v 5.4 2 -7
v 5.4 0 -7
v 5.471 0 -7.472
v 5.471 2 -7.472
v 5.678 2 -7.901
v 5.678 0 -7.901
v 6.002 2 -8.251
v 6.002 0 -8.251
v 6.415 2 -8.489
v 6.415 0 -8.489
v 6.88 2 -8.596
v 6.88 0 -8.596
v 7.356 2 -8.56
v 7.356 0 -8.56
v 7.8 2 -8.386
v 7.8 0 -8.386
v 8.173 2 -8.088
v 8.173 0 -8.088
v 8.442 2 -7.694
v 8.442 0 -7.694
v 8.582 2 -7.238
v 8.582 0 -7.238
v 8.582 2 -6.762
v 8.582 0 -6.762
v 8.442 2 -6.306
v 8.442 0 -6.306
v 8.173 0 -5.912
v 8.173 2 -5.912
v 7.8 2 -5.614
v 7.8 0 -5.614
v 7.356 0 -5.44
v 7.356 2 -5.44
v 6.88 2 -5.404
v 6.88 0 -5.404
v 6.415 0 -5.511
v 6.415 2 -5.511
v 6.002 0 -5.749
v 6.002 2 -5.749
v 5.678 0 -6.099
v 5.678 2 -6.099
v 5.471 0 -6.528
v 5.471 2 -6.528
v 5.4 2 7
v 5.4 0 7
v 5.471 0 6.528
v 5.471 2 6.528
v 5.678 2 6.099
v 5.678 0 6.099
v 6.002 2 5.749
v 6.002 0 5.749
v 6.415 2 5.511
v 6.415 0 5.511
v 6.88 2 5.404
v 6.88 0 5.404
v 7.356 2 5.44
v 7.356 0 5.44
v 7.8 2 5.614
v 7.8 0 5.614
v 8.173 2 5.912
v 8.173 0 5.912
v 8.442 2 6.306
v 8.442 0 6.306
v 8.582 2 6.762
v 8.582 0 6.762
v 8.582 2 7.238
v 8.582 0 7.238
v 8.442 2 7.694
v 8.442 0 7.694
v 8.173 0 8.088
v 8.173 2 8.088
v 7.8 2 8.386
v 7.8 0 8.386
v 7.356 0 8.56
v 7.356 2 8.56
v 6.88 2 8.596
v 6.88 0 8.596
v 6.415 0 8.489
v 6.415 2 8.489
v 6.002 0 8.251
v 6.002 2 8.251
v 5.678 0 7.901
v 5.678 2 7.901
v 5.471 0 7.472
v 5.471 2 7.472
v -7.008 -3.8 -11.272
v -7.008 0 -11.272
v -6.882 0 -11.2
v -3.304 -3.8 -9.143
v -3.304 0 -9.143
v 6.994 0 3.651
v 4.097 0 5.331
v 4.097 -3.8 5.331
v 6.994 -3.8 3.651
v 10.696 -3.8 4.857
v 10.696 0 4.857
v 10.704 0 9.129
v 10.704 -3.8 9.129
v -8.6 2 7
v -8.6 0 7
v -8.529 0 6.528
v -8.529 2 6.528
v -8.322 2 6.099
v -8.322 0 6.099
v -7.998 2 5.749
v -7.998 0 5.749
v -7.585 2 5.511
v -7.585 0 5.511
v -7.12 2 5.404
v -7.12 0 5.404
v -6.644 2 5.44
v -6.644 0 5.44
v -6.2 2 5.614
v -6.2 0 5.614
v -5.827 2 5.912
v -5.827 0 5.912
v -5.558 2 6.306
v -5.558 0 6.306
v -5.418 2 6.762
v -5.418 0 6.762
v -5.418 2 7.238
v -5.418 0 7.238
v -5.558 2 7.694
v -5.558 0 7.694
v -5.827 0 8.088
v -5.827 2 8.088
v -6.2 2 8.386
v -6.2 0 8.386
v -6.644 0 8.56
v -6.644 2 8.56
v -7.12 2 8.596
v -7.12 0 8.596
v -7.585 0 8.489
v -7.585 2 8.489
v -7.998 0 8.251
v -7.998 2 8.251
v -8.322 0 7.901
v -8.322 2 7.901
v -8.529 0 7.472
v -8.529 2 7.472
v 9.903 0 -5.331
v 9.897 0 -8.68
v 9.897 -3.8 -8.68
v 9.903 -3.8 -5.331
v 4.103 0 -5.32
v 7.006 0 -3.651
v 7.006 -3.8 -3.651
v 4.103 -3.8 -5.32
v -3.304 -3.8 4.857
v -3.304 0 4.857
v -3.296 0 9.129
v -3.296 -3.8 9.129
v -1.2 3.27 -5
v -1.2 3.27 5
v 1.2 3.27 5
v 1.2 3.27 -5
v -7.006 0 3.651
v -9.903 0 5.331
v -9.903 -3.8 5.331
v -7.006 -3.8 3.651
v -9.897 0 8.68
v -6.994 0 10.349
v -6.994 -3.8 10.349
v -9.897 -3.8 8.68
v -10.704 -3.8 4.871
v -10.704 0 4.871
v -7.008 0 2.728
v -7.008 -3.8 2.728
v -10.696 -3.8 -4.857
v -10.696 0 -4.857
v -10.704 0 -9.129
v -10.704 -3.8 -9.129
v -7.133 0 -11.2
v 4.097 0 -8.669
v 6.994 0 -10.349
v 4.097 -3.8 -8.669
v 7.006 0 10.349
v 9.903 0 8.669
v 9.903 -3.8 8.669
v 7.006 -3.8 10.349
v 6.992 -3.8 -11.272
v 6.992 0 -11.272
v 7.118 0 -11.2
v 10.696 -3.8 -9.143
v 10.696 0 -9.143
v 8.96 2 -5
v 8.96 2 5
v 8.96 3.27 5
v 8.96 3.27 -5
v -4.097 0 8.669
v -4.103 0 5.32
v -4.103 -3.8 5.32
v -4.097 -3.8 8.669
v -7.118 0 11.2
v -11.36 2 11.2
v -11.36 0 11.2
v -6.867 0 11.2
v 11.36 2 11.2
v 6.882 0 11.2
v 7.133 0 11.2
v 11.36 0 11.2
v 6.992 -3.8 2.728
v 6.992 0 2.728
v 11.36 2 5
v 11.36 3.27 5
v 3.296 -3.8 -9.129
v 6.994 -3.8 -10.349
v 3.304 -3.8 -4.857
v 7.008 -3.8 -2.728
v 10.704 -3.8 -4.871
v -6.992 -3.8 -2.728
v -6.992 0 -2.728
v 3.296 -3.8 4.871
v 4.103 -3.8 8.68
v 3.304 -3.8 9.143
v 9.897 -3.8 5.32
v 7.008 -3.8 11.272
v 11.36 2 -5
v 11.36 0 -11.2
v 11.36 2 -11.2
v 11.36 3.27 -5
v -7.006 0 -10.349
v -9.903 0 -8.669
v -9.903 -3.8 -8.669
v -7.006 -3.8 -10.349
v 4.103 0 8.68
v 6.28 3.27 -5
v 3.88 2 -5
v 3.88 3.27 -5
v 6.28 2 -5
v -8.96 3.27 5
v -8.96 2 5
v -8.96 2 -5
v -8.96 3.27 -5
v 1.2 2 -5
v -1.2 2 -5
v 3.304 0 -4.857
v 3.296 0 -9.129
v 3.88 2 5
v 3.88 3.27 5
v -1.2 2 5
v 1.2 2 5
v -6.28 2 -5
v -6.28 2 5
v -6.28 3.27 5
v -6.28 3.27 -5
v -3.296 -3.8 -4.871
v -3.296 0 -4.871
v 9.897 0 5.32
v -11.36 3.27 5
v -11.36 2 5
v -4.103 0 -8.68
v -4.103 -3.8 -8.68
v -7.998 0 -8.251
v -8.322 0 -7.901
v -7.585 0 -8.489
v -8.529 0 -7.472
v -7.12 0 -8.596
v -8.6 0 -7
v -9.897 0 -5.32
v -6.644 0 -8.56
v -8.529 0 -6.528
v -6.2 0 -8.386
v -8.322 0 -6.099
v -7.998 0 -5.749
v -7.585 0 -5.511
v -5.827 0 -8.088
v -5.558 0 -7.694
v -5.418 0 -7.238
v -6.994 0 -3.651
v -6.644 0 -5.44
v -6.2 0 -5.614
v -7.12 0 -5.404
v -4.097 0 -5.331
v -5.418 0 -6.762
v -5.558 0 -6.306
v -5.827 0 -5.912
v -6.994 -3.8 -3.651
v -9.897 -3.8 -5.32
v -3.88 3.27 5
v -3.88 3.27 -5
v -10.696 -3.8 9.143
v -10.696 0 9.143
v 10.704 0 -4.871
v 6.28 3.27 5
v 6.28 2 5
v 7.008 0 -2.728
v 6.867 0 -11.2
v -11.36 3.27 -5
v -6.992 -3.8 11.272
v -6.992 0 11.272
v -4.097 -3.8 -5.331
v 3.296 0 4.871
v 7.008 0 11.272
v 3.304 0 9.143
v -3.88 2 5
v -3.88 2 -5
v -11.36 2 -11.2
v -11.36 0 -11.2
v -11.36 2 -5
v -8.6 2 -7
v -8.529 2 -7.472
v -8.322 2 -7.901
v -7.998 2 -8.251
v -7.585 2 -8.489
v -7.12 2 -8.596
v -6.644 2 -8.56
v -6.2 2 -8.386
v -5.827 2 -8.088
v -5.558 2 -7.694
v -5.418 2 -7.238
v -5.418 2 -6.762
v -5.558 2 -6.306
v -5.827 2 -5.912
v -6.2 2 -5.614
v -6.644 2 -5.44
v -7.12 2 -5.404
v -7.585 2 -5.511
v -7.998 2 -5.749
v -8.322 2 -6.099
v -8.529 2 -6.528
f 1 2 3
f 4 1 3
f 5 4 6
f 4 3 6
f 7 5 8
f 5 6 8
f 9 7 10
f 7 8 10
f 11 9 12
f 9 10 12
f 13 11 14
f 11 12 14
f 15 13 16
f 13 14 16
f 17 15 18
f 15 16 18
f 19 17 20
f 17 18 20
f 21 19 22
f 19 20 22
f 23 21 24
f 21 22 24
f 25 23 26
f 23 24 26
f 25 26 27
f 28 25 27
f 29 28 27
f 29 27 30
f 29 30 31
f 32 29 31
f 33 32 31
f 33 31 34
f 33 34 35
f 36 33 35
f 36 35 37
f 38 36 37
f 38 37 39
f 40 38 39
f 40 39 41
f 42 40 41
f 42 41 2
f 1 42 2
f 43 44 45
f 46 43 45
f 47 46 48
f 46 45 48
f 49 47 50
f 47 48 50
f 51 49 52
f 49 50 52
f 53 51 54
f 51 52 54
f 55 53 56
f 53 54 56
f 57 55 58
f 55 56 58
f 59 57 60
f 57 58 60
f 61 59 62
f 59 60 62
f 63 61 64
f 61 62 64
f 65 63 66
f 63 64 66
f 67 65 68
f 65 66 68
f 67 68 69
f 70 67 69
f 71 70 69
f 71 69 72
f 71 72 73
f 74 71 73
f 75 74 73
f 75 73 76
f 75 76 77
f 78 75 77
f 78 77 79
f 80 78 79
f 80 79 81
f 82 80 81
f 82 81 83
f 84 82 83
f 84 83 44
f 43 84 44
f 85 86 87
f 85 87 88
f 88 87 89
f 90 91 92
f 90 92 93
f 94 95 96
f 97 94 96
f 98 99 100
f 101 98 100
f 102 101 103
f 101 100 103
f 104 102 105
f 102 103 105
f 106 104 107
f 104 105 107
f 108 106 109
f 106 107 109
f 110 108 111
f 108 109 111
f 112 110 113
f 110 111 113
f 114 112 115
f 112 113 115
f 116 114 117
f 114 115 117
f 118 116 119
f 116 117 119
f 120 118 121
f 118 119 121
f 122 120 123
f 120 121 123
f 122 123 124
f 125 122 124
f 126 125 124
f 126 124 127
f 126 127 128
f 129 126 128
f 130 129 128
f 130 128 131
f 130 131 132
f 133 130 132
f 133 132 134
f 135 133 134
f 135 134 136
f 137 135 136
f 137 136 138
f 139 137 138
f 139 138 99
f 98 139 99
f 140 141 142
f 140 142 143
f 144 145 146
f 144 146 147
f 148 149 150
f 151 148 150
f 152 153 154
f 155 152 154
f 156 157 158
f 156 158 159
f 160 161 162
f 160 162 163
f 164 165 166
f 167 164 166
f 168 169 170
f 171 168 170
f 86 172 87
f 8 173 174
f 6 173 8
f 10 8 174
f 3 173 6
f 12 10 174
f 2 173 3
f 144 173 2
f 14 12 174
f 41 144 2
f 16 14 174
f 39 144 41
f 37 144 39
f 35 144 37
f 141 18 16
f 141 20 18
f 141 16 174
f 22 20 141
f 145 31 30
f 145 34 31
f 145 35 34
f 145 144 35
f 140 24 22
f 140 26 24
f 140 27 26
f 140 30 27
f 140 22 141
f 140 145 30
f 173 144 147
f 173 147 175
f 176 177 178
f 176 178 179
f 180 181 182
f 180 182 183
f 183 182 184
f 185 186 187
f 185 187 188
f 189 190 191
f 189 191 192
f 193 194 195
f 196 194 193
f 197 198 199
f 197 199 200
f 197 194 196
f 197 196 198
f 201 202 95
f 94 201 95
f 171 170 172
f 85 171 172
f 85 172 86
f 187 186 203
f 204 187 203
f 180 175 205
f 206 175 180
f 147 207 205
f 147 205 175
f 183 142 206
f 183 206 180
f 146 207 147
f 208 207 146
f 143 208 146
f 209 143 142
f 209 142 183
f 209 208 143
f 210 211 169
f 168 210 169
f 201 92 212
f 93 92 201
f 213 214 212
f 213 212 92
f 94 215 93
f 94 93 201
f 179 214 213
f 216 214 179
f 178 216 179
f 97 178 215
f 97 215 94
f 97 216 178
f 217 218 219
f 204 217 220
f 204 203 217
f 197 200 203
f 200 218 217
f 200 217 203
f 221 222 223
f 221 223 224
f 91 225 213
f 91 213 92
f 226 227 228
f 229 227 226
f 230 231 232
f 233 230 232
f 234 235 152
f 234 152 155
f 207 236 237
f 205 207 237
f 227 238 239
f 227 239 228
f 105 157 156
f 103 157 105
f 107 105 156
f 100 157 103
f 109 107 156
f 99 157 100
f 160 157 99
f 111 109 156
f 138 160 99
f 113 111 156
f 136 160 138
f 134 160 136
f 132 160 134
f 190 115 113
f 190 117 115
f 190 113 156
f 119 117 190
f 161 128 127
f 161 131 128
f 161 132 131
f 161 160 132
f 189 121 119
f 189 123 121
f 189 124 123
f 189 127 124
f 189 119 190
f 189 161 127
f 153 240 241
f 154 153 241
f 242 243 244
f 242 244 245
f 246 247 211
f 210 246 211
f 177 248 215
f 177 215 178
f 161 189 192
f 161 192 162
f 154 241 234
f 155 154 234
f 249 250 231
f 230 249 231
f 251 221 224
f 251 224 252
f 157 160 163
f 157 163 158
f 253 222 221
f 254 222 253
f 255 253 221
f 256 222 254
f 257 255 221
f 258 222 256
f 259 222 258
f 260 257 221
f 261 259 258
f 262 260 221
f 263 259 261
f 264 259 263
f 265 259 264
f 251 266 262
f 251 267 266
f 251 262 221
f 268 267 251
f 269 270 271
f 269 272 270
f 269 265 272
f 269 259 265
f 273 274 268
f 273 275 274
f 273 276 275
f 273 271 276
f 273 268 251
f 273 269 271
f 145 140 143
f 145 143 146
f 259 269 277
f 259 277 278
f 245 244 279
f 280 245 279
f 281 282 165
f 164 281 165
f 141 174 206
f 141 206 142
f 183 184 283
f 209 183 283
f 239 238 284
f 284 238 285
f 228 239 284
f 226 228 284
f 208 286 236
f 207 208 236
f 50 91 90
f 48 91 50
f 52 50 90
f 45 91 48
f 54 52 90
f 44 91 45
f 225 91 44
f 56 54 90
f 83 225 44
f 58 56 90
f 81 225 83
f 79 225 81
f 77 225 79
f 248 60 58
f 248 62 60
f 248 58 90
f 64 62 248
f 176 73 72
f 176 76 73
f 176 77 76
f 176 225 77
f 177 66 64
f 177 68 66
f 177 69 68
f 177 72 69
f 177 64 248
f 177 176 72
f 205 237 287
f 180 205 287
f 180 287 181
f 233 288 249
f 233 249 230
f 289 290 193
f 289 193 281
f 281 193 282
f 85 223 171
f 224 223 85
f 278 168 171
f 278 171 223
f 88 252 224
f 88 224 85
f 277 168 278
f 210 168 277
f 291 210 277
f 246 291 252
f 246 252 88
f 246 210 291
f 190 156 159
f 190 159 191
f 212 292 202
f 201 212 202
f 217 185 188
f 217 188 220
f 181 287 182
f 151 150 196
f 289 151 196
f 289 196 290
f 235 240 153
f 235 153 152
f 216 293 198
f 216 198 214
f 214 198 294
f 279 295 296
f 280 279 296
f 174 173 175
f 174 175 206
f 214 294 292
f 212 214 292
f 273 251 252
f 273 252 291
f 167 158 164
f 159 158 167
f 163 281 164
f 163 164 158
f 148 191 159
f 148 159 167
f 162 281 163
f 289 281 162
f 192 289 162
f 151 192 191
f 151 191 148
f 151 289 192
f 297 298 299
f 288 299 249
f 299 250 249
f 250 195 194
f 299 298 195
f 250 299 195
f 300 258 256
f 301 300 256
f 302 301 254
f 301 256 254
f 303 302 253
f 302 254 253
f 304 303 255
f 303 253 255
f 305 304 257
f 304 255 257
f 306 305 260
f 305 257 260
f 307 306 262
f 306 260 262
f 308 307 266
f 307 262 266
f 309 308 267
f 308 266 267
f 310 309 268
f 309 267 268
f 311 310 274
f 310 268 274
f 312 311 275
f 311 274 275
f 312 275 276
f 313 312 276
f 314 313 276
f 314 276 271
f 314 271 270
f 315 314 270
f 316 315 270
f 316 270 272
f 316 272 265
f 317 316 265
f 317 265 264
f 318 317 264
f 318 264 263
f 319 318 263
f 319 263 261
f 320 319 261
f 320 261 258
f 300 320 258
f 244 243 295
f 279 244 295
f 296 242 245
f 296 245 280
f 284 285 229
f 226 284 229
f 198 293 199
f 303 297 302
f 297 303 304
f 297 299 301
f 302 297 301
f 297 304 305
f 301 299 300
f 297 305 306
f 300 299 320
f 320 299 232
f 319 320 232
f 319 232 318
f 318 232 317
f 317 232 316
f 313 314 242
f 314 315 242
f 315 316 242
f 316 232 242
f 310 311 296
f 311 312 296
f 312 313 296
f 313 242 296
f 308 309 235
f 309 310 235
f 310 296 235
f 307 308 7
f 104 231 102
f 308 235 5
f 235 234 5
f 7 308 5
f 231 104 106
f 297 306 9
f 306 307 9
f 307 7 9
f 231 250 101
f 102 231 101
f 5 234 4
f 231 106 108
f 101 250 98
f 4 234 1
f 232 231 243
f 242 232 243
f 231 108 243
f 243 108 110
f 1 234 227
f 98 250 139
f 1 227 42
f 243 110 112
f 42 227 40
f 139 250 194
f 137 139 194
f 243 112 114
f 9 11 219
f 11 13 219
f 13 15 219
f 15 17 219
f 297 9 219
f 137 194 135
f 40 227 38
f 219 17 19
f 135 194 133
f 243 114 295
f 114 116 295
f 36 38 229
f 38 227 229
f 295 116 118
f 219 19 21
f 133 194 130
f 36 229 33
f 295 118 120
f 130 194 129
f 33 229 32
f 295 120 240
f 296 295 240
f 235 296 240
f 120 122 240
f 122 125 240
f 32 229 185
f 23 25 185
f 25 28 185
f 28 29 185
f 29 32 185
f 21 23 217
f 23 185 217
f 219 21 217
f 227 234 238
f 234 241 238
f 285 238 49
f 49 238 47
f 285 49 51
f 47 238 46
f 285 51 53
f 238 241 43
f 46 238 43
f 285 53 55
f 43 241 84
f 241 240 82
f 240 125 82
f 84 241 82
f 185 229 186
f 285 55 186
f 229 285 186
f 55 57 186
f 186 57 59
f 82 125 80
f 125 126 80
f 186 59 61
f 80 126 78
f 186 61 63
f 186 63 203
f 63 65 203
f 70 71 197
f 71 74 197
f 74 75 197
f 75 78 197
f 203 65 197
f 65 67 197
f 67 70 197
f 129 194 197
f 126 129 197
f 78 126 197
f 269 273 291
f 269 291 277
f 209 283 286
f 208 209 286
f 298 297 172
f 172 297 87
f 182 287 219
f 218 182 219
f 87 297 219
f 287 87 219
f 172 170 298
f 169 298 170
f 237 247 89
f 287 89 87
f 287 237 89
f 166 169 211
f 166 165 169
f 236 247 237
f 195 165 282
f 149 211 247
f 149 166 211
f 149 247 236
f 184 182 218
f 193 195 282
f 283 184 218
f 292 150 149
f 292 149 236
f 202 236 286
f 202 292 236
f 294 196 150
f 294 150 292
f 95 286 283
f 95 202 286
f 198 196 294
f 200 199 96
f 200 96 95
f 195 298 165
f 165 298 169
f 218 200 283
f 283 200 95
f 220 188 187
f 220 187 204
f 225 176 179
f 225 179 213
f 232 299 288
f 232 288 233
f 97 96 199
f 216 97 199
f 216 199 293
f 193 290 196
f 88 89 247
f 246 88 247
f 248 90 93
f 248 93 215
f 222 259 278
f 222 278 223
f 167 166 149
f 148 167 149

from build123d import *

# Parameters (mm, degrees)
SKETCH_1_W                 = 22.72
SKETCH_1_H                 = 10
EXTRUDE_269_DEPTH          = 2
SKETCH_3_W                 = 2.4
SKETCH_3_H                 = 10
EXTRUDE_2_DEPTH            = 1.27
PATTERN_LINEAR_1_COUNT     = 3
PATTERN_LINEAR_1_PITCH     = 5.08
PATTERN_LINEAR_1_COL_COUNT = 3
PATTERN_LINEAR_1_COL_PITCH = 5.08
EXTRUDE_START              = 5
SKETCH_4_W                 = 22.72
SKETCH_4_H                 = 2
EXTRUDE_3_DEPTH            = 6.2
EXTRUDE_START_2            = -5
SKETCH_4_2_W               = 22.72
SKETCH_4_2_H               = 2
EXTRUDE_4_DEPTH            = 6.2
EXTRUDE_1_DEPTH            = 3.8
HOLE_WIZARD_M3_1_D         = 3.2


with BuildPart() as part:
    # 草图1 → Extrude 269 (new body)
    with BuildSketch(Plane(origin=(0, 0, 0), x_dir=(1, 0, 0), z_dir=(0, 1, 0))):
        Rectangle(SKETCH_1_W, SKETCH_1_H)
    extrude(amount=EXTRUDE_269_DEPTH)

    # 草图3 → 凸台-拉伸2 (add)
    with BuildSketch(Plane(origin=(0, 2, 0), x_dir=(1, 0, 0), z_dir=(0, 1, 0))):
        Rectangle(SKETCH_3_W, SKETCH_3_H)
    extrude_2 = extrude(amount=EXTRUDE_2_DEPTH)

    # 阵列(线性)1: 凸台-拉伸2 ×3
    with Locations(*[(i * PATTERN_LINEAR_1_PITCH, 0, 0) for i in range(1, PATTERN_LINEAR_1_COUNT)]):
        add(extrude_2)

    # 阵列(线性)1 col: 凸台-拉伸2 ×3
    with Locations(*[(-i * PATTERN_LINEAR_1_COL_PITCH, 0, 0) for i in range(1, PATTERN_LINEAR_1_COL_COUNT)]):
        add(extrude_2)

    # 草图4 → 凸台-拉伸3 (add)
    with BuildSketch(Plane.XY.offset(EXTRUDE_START)):
        with Locations((0, 1)):
            Rectangle(SKETCH_4_W, SKETCH_4_H)
    extrude(amount=EXTRUDE_3_DEPTH)

    # 草图4<2> → 凸台-拉伸4 (add)
    with BuildSketch(Plane.XY.offset(EXTRUDE_START_2)):
        with Locations((0, 1)):
            Rectangle(SKETCH_4_2_W, SKETCH_4_2_H)
    extrude(amount=-EXTRUDE_4_DEPTH)

    # 草图5 → 拉伸-薄壁1 (add)
    with BuildSketch(Plane.XZ):
        Polygon((7.007942216, 11.27238461), (3.303977501, 9.143070466), (3.296035285, 4.870685856), (6.992057784, 2.72761539), (10.696022499, 4.856929534), (10.703964715, 9.129314144), align=None)
        Polygon((7.00622498, 10.348625775), (4.103117501, 8.679703878), (4.096892521, 5.331078103), (6.99377502, 3.651374225), (9.896882499, 5.320296122), (9.903107479, 8.668921897), align=None, mode=Mode.SUBTRACT)
    extrude_1 = extrude(amount=EXTRUDE_1_DEPTH)

    # 草图阵列1: 拉伸-薄壁1 at 3 more places
    with Locations((0, 0, -14), (-14, 0, -14), (-14, 0, 0)):
        add(extrude_1)

    # M3 间隙孔1 (through all)
    with Locations(Plane(origin=(0, 2, 0), x_dir=(1, 0, 0), z_dir=(0, 1, 0))):
        with Locations((7, -7)):
            hole_wizard_m3_1 = Hole(HOLE_WIZARD_M3_1_D / 2)

    # 草图阵列2: M3 间隙孔1 at 3 more places
    with Locations((0, 0, -14), (-14, 0, -14), (-14, 0, 0)):
        add(hole_wizard_m3_1, mode=Mode.SUBTRACT)


solid = part.part
